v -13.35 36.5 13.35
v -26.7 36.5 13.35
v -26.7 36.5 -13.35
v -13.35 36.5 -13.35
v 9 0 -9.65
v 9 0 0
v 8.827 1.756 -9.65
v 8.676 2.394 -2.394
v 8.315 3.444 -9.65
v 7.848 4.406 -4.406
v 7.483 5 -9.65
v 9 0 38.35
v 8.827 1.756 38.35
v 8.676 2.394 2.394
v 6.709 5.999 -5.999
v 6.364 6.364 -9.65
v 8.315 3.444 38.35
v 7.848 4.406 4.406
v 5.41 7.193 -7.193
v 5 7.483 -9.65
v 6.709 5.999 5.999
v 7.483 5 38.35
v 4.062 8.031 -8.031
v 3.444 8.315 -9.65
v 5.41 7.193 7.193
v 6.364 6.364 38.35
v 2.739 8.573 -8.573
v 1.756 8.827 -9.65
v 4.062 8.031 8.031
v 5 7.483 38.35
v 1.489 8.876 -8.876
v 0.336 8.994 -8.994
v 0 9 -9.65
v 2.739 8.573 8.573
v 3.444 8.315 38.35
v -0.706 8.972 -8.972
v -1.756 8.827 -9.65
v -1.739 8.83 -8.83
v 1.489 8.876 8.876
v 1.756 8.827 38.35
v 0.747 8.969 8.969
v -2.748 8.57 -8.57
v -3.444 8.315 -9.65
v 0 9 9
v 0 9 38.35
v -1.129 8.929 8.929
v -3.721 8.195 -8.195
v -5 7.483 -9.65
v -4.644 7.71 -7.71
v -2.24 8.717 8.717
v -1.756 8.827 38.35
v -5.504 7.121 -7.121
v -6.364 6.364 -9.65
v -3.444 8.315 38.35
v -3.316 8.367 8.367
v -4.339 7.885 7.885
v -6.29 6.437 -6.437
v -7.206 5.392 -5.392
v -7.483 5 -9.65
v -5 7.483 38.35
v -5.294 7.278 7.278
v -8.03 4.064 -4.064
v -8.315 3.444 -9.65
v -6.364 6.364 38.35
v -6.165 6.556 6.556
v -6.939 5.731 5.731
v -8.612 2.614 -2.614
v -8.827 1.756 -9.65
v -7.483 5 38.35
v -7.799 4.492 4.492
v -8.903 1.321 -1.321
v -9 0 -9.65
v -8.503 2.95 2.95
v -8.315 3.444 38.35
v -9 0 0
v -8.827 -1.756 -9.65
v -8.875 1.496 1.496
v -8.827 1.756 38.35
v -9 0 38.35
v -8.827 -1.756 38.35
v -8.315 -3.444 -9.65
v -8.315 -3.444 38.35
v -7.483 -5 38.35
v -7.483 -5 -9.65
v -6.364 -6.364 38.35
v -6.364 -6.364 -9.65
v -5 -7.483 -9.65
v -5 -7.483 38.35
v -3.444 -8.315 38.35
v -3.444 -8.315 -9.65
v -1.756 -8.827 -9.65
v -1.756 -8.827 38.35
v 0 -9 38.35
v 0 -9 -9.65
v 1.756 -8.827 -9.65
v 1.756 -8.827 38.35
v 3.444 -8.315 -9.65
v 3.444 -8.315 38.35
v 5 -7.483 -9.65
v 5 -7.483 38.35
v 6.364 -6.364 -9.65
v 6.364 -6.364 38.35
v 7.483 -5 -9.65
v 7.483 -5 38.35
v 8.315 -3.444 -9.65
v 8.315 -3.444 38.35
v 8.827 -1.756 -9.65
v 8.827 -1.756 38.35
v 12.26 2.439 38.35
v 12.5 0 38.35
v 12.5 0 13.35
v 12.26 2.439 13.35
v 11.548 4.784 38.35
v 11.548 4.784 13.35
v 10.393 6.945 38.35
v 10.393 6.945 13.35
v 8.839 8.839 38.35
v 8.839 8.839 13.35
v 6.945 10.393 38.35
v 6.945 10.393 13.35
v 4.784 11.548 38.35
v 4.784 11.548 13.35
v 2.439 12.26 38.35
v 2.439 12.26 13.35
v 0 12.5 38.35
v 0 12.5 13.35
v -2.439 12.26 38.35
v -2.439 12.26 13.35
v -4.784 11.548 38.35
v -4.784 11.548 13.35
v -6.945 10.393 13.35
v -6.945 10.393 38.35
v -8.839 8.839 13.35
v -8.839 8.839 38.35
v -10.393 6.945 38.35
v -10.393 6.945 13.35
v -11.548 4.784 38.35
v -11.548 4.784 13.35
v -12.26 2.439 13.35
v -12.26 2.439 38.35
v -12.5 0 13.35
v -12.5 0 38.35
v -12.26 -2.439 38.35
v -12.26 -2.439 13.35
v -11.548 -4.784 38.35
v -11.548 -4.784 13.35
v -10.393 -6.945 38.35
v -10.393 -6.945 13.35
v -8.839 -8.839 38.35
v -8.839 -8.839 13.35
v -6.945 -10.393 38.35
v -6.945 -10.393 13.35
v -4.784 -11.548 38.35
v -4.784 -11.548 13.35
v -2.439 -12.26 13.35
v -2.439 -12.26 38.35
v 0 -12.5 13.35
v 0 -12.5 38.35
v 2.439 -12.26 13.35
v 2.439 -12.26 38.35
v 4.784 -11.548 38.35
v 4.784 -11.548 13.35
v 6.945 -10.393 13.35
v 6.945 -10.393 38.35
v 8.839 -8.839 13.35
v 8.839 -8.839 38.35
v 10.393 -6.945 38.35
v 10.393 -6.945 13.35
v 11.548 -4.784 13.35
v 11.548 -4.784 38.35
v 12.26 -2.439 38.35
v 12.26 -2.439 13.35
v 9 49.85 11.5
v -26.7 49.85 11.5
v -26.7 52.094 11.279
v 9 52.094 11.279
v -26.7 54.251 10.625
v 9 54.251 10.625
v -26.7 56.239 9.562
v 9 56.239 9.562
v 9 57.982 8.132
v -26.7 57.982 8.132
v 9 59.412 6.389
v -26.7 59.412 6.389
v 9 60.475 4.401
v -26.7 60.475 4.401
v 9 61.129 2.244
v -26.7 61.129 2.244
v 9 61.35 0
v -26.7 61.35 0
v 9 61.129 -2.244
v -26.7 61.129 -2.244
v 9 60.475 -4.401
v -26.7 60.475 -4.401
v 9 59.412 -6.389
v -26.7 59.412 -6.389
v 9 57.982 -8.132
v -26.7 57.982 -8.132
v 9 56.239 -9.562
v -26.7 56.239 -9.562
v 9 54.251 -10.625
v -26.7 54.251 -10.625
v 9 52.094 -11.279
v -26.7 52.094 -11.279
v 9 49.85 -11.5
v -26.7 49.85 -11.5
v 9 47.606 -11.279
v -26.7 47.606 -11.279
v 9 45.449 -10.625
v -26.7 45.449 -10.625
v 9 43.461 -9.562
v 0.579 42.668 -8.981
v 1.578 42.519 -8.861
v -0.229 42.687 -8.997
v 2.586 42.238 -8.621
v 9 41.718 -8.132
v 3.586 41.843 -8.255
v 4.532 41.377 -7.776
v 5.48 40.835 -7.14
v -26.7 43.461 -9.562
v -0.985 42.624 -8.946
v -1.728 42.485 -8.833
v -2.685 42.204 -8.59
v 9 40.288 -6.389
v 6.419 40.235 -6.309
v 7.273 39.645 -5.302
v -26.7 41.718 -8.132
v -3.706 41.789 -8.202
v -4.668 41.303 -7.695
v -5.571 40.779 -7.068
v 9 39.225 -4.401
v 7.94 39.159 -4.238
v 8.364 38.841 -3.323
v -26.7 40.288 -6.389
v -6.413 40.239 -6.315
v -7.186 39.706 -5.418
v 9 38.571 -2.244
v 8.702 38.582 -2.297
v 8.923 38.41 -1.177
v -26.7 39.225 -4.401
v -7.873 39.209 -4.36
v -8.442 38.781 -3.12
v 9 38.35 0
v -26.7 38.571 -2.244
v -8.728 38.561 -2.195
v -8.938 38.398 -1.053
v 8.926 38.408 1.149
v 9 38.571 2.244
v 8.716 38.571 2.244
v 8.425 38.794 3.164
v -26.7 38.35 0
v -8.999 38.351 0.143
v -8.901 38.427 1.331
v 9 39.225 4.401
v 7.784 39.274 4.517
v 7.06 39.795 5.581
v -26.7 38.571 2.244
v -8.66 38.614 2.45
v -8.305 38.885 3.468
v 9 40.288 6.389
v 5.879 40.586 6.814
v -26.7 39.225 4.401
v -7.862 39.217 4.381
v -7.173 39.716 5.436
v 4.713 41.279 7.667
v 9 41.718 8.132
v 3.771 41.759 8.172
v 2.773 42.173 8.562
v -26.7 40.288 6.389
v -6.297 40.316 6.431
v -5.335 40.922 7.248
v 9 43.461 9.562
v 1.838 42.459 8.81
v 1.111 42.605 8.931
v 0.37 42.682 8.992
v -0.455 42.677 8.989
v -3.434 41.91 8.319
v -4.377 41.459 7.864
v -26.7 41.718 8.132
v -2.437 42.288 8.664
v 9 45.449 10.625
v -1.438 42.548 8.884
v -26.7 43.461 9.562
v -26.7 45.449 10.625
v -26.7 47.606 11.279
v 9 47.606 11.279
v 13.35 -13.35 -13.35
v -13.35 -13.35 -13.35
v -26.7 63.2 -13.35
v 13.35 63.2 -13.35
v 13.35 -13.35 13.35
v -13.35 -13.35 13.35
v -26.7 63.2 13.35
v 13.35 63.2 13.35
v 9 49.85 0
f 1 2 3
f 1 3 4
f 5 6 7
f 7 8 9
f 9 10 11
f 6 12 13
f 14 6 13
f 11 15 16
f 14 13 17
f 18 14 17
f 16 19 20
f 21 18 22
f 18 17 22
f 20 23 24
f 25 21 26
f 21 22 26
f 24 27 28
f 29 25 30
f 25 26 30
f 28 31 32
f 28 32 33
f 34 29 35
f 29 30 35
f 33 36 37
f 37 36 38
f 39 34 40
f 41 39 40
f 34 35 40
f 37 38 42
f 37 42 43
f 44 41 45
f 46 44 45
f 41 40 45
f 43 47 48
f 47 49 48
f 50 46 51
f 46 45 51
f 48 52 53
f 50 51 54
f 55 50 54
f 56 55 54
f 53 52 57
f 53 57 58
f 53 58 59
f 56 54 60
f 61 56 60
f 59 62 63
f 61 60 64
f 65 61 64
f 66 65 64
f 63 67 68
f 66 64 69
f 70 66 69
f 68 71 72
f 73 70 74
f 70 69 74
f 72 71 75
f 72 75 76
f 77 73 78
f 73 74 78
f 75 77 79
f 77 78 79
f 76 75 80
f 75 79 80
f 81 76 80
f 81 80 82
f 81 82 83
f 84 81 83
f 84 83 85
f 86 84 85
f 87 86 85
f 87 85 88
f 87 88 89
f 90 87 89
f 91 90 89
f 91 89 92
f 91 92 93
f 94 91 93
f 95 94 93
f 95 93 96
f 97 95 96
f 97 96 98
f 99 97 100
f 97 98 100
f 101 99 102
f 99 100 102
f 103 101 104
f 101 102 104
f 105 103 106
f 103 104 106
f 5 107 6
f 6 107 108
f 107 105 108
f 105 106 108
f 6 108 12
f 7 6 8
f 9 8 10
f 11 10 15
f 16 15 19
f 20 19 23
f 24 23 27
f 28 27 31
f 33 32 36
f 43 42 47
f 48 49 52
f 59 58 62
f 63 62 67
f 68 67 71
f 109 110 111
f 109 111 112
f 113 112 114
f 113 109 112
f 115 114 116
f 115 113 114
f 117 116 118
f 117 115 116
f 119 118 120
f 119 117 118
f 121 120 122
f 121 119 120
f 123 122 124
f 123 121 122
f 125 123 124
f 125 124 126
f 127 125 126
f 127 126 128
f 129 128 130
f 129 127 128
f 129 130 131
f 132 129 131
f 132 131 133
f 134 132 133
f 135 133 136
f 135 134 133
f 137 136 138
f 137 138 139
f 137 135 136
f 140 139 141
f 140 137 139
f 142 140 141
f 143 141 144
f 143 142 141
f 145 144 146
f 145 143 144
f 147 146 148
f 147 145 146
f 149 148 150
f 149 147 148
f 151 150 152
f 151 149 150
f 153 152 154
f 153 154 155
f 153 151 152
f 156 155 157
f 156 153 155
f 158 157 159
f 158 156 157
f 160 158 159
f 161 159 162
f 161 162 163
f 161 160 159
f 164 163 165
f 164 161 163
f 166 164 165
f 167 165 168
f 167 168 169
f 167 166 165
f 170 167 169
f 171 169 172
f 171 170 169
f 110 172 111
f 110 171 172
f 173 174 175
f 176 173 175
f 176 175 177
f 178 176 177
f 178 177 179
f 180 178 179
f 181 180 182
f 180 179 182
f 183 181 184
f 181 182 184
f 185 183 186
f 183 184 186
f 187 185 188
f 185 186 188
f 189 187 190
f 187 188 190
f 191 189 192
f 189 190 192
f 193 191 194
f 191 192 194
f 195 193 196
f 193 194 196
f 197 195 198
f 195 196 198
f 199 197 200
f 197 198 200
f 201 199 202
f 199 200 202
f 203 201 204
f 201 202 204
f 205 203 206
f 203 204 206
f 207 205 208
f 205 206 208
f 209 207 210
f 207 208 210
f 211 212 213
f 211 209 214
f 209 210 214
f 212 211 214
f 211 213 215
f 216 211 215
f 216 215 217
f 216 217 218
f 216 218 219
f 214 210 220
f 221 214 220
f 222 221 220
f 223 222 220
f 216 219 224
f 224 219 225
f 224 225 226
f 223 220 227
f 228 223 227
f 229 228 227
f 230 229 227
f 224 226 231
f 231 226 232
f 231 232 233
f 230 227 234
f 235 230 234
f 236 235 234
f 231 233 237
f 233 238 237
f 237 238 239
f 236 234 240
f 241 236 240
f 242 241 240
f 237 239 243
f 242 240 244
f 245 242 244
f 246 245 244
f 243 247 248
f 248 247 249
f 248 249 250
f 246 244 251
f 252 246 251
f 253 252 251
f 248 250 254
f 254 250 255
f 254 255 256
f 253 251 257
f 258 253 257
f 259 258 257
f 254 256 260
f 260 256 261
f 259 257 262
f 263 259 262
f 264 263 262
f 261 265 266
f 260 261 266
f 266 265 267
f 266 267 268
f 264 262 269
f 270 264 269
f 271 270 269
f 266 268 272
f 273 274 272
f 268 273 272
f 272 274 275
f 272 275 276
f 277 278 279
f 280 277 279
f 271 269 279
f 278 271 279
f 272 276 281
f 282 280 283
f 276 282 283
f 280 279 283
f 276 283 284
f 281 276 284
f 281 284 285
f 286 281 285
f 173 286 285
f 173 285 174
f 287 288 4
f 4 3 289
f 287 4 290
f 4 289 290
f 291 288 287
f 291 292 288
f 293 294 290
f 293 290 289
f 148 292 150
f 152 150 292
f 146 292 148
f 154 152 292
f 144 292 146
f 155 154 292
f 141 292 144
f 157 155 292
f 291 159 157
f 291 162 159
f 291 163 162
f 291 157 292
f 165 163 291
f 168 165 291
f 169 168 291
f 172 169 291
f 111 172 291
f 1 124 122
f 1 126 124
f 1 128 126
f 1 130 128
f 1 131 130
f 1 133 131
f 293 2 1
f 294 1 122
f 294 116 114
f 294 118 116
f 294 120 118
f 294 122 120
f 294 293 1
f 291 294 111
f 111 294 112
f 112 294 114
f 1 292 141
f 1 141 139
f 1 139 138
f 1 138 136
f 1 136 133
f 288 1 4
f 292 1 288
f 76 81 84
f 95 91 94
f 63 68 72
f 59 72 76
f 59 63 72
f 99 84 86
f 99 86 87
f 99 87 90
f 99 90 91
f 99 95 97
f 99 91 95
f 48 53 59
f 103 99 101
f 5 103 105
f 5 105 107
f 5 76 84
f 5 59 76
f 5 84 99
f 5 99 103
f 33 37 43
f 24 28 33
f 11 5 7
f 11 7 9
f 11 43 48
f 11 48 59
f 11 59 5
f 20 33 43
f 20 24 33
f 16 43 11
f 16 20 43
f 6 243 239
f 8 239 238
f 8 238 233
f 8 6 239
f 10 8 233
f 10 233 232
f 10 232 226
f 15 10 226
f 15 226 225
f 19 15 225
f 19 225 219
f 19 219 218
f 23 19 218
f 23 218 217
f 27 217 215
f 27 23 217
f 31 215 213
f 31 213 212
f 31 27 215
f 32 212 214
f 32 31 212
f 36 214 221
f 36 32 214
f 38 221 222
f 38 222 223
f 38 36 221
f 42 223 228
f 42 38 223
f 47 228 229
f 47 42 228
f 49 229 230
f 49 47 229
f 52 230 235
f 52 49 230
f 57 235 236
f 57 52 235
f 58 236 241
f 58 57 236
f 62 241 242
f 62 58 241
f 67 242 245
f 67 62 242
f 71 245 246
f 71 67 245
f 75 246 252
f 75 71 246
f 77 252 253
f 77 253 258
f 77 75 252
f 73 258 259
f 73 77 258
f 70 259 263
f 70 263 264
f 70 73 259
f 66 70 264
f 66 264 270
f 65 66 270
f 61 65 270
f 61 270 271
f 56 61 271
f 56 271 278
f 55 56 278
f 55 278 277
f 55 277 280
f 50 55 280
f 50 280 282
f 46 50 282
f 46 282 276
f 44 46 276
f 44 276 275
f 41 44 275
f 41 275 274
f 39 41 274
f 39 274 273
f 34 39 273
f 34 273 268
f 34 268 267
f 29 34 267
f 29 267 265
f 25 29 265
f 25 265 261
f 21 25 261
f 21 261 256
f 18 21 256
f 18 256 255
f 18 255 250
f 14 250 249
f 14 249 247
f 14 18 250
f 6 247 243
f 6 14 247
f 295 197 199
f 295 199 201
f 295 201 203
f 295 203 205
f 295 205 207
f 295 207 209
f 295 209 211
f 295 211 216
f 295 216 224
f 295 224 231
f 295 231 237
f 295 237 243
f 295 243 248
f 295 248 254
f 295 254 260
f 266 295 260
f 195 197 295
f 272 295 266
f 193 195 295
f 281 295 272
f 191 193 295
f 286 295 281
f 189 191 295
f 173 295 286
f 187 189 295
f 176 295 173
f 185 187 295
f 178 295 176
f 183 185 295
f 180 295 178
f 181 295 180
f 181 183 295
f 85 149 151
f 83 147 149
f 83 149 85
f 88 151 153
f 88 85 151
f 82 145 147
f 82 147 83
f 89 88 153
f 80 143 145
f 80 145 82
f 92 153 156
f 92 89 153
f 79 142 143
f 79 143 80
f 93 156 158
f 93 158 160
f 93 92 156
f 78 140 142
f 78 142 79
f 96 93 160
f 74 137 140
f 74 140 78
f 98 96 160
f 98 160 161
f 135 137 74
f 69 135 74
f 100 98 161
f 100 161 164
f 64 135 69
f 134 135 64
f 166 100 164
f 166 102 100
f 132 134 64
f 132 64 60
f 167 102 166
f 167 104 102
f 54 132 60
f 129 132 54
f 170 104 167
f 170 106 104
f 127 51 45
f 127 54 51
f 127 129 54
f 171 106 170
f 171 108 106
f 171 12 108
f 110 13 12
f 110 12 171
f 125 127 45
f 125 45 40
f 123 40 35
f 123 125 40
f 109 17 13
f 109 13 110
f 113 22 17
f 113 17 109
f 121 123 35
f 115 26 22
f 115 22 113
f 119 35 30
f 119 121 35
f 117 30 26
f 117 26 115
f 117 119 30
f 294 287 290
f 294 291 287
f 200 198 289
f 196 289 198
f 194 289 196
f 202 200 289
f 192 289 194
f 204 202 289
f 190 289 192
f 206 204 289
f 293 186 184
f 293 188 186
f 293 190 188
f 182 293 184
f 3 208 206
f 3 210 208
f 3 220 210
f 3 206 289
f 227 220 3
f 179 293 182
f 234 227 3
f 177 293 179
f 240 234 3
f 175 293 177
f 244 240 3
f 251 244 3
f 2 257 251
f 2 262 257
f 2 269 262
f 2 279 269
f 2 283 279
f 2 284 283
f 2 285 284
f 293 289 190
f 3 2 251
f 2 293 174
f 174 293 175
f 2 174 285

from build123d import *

# Parameters (mm, degrees)
BOSS_EXTRUDE1_DEPTH = 13.35
SKETCH3_R           = 9
CUT_EXTRUDE1_DEPTH  = 23
SKETCH4_R           = 11.5
CUT_EXTRUDE3_DEPTH  = 35.7
SKETCH7_R           = 9
CUT_EXTRUDE9_DEPTH  = 49.85
BOSS_EXTRUDE2_START = 25
SKETCH8_R           = 12.5
SKETCH8_R_2         = 9
BOSS_EXTRUDE2_DEPTH = 25


with BuildPart() as part:
    # Sketch2 → Boss-Extrude1 (new, symmetric)
    with BuildSketch(Plane.XY):
        Polygon((0, -13.35), (13.35, -13.35), (13.35, 63.2), (-26.7, 63.2), (-26.7, 36.5), (-13.35, 36.5), (-13.35, -13.35), align=None)
    extrude(amount=BOSS_EXTRUDE1_DEPTH, both=True)

    # Sketch3 → Cut-Extrude1 (cut)
    with BuildSketch(Plane.XY.offset(13.35)):
        Circle(SKETCH3_R)
    extrude(amount=-CUT_EXTRUDE1_DEPTH, mode=Mode.SUBTRACT)

    # Sketch4 → Cut-Extrude3 (cut)
    with BuildSketch(Plane.ZY.offset(26.7)):
        with Locations((0, 49.85)):
            Circle(SKETCH4_R)
    extrude(amount=-CUT_EXTRUDE3_DEPTH, mode=Mode.SUBTRACT)

    # Sketch7 → Cut-Extrude9 (cut)
    with BuildSketch(Plane(origin=(0, 0, 0), x_dir=(1, 0, 0), z_dir=(0, 1, 0))):
        Circle(SKETCH7_R)
    extrude(amount=CUT_EXTRUDE9_DEPTH, mode=Mode.SUBTRACT)

    # Sketch8 → Boss-Extrude2 (add)
    with BuildSketch(Plane.XY.offset(13.35).offset(BOSS_EXTRUDE2_START)):
        Circle(SKETCH8_R)
        Circle(SKETCH8_R_2, mode=Mode.SUBTRACT)
    extrude(amount=-BOSS_EXTRUDE2_DEPTH)


solid = part.part
